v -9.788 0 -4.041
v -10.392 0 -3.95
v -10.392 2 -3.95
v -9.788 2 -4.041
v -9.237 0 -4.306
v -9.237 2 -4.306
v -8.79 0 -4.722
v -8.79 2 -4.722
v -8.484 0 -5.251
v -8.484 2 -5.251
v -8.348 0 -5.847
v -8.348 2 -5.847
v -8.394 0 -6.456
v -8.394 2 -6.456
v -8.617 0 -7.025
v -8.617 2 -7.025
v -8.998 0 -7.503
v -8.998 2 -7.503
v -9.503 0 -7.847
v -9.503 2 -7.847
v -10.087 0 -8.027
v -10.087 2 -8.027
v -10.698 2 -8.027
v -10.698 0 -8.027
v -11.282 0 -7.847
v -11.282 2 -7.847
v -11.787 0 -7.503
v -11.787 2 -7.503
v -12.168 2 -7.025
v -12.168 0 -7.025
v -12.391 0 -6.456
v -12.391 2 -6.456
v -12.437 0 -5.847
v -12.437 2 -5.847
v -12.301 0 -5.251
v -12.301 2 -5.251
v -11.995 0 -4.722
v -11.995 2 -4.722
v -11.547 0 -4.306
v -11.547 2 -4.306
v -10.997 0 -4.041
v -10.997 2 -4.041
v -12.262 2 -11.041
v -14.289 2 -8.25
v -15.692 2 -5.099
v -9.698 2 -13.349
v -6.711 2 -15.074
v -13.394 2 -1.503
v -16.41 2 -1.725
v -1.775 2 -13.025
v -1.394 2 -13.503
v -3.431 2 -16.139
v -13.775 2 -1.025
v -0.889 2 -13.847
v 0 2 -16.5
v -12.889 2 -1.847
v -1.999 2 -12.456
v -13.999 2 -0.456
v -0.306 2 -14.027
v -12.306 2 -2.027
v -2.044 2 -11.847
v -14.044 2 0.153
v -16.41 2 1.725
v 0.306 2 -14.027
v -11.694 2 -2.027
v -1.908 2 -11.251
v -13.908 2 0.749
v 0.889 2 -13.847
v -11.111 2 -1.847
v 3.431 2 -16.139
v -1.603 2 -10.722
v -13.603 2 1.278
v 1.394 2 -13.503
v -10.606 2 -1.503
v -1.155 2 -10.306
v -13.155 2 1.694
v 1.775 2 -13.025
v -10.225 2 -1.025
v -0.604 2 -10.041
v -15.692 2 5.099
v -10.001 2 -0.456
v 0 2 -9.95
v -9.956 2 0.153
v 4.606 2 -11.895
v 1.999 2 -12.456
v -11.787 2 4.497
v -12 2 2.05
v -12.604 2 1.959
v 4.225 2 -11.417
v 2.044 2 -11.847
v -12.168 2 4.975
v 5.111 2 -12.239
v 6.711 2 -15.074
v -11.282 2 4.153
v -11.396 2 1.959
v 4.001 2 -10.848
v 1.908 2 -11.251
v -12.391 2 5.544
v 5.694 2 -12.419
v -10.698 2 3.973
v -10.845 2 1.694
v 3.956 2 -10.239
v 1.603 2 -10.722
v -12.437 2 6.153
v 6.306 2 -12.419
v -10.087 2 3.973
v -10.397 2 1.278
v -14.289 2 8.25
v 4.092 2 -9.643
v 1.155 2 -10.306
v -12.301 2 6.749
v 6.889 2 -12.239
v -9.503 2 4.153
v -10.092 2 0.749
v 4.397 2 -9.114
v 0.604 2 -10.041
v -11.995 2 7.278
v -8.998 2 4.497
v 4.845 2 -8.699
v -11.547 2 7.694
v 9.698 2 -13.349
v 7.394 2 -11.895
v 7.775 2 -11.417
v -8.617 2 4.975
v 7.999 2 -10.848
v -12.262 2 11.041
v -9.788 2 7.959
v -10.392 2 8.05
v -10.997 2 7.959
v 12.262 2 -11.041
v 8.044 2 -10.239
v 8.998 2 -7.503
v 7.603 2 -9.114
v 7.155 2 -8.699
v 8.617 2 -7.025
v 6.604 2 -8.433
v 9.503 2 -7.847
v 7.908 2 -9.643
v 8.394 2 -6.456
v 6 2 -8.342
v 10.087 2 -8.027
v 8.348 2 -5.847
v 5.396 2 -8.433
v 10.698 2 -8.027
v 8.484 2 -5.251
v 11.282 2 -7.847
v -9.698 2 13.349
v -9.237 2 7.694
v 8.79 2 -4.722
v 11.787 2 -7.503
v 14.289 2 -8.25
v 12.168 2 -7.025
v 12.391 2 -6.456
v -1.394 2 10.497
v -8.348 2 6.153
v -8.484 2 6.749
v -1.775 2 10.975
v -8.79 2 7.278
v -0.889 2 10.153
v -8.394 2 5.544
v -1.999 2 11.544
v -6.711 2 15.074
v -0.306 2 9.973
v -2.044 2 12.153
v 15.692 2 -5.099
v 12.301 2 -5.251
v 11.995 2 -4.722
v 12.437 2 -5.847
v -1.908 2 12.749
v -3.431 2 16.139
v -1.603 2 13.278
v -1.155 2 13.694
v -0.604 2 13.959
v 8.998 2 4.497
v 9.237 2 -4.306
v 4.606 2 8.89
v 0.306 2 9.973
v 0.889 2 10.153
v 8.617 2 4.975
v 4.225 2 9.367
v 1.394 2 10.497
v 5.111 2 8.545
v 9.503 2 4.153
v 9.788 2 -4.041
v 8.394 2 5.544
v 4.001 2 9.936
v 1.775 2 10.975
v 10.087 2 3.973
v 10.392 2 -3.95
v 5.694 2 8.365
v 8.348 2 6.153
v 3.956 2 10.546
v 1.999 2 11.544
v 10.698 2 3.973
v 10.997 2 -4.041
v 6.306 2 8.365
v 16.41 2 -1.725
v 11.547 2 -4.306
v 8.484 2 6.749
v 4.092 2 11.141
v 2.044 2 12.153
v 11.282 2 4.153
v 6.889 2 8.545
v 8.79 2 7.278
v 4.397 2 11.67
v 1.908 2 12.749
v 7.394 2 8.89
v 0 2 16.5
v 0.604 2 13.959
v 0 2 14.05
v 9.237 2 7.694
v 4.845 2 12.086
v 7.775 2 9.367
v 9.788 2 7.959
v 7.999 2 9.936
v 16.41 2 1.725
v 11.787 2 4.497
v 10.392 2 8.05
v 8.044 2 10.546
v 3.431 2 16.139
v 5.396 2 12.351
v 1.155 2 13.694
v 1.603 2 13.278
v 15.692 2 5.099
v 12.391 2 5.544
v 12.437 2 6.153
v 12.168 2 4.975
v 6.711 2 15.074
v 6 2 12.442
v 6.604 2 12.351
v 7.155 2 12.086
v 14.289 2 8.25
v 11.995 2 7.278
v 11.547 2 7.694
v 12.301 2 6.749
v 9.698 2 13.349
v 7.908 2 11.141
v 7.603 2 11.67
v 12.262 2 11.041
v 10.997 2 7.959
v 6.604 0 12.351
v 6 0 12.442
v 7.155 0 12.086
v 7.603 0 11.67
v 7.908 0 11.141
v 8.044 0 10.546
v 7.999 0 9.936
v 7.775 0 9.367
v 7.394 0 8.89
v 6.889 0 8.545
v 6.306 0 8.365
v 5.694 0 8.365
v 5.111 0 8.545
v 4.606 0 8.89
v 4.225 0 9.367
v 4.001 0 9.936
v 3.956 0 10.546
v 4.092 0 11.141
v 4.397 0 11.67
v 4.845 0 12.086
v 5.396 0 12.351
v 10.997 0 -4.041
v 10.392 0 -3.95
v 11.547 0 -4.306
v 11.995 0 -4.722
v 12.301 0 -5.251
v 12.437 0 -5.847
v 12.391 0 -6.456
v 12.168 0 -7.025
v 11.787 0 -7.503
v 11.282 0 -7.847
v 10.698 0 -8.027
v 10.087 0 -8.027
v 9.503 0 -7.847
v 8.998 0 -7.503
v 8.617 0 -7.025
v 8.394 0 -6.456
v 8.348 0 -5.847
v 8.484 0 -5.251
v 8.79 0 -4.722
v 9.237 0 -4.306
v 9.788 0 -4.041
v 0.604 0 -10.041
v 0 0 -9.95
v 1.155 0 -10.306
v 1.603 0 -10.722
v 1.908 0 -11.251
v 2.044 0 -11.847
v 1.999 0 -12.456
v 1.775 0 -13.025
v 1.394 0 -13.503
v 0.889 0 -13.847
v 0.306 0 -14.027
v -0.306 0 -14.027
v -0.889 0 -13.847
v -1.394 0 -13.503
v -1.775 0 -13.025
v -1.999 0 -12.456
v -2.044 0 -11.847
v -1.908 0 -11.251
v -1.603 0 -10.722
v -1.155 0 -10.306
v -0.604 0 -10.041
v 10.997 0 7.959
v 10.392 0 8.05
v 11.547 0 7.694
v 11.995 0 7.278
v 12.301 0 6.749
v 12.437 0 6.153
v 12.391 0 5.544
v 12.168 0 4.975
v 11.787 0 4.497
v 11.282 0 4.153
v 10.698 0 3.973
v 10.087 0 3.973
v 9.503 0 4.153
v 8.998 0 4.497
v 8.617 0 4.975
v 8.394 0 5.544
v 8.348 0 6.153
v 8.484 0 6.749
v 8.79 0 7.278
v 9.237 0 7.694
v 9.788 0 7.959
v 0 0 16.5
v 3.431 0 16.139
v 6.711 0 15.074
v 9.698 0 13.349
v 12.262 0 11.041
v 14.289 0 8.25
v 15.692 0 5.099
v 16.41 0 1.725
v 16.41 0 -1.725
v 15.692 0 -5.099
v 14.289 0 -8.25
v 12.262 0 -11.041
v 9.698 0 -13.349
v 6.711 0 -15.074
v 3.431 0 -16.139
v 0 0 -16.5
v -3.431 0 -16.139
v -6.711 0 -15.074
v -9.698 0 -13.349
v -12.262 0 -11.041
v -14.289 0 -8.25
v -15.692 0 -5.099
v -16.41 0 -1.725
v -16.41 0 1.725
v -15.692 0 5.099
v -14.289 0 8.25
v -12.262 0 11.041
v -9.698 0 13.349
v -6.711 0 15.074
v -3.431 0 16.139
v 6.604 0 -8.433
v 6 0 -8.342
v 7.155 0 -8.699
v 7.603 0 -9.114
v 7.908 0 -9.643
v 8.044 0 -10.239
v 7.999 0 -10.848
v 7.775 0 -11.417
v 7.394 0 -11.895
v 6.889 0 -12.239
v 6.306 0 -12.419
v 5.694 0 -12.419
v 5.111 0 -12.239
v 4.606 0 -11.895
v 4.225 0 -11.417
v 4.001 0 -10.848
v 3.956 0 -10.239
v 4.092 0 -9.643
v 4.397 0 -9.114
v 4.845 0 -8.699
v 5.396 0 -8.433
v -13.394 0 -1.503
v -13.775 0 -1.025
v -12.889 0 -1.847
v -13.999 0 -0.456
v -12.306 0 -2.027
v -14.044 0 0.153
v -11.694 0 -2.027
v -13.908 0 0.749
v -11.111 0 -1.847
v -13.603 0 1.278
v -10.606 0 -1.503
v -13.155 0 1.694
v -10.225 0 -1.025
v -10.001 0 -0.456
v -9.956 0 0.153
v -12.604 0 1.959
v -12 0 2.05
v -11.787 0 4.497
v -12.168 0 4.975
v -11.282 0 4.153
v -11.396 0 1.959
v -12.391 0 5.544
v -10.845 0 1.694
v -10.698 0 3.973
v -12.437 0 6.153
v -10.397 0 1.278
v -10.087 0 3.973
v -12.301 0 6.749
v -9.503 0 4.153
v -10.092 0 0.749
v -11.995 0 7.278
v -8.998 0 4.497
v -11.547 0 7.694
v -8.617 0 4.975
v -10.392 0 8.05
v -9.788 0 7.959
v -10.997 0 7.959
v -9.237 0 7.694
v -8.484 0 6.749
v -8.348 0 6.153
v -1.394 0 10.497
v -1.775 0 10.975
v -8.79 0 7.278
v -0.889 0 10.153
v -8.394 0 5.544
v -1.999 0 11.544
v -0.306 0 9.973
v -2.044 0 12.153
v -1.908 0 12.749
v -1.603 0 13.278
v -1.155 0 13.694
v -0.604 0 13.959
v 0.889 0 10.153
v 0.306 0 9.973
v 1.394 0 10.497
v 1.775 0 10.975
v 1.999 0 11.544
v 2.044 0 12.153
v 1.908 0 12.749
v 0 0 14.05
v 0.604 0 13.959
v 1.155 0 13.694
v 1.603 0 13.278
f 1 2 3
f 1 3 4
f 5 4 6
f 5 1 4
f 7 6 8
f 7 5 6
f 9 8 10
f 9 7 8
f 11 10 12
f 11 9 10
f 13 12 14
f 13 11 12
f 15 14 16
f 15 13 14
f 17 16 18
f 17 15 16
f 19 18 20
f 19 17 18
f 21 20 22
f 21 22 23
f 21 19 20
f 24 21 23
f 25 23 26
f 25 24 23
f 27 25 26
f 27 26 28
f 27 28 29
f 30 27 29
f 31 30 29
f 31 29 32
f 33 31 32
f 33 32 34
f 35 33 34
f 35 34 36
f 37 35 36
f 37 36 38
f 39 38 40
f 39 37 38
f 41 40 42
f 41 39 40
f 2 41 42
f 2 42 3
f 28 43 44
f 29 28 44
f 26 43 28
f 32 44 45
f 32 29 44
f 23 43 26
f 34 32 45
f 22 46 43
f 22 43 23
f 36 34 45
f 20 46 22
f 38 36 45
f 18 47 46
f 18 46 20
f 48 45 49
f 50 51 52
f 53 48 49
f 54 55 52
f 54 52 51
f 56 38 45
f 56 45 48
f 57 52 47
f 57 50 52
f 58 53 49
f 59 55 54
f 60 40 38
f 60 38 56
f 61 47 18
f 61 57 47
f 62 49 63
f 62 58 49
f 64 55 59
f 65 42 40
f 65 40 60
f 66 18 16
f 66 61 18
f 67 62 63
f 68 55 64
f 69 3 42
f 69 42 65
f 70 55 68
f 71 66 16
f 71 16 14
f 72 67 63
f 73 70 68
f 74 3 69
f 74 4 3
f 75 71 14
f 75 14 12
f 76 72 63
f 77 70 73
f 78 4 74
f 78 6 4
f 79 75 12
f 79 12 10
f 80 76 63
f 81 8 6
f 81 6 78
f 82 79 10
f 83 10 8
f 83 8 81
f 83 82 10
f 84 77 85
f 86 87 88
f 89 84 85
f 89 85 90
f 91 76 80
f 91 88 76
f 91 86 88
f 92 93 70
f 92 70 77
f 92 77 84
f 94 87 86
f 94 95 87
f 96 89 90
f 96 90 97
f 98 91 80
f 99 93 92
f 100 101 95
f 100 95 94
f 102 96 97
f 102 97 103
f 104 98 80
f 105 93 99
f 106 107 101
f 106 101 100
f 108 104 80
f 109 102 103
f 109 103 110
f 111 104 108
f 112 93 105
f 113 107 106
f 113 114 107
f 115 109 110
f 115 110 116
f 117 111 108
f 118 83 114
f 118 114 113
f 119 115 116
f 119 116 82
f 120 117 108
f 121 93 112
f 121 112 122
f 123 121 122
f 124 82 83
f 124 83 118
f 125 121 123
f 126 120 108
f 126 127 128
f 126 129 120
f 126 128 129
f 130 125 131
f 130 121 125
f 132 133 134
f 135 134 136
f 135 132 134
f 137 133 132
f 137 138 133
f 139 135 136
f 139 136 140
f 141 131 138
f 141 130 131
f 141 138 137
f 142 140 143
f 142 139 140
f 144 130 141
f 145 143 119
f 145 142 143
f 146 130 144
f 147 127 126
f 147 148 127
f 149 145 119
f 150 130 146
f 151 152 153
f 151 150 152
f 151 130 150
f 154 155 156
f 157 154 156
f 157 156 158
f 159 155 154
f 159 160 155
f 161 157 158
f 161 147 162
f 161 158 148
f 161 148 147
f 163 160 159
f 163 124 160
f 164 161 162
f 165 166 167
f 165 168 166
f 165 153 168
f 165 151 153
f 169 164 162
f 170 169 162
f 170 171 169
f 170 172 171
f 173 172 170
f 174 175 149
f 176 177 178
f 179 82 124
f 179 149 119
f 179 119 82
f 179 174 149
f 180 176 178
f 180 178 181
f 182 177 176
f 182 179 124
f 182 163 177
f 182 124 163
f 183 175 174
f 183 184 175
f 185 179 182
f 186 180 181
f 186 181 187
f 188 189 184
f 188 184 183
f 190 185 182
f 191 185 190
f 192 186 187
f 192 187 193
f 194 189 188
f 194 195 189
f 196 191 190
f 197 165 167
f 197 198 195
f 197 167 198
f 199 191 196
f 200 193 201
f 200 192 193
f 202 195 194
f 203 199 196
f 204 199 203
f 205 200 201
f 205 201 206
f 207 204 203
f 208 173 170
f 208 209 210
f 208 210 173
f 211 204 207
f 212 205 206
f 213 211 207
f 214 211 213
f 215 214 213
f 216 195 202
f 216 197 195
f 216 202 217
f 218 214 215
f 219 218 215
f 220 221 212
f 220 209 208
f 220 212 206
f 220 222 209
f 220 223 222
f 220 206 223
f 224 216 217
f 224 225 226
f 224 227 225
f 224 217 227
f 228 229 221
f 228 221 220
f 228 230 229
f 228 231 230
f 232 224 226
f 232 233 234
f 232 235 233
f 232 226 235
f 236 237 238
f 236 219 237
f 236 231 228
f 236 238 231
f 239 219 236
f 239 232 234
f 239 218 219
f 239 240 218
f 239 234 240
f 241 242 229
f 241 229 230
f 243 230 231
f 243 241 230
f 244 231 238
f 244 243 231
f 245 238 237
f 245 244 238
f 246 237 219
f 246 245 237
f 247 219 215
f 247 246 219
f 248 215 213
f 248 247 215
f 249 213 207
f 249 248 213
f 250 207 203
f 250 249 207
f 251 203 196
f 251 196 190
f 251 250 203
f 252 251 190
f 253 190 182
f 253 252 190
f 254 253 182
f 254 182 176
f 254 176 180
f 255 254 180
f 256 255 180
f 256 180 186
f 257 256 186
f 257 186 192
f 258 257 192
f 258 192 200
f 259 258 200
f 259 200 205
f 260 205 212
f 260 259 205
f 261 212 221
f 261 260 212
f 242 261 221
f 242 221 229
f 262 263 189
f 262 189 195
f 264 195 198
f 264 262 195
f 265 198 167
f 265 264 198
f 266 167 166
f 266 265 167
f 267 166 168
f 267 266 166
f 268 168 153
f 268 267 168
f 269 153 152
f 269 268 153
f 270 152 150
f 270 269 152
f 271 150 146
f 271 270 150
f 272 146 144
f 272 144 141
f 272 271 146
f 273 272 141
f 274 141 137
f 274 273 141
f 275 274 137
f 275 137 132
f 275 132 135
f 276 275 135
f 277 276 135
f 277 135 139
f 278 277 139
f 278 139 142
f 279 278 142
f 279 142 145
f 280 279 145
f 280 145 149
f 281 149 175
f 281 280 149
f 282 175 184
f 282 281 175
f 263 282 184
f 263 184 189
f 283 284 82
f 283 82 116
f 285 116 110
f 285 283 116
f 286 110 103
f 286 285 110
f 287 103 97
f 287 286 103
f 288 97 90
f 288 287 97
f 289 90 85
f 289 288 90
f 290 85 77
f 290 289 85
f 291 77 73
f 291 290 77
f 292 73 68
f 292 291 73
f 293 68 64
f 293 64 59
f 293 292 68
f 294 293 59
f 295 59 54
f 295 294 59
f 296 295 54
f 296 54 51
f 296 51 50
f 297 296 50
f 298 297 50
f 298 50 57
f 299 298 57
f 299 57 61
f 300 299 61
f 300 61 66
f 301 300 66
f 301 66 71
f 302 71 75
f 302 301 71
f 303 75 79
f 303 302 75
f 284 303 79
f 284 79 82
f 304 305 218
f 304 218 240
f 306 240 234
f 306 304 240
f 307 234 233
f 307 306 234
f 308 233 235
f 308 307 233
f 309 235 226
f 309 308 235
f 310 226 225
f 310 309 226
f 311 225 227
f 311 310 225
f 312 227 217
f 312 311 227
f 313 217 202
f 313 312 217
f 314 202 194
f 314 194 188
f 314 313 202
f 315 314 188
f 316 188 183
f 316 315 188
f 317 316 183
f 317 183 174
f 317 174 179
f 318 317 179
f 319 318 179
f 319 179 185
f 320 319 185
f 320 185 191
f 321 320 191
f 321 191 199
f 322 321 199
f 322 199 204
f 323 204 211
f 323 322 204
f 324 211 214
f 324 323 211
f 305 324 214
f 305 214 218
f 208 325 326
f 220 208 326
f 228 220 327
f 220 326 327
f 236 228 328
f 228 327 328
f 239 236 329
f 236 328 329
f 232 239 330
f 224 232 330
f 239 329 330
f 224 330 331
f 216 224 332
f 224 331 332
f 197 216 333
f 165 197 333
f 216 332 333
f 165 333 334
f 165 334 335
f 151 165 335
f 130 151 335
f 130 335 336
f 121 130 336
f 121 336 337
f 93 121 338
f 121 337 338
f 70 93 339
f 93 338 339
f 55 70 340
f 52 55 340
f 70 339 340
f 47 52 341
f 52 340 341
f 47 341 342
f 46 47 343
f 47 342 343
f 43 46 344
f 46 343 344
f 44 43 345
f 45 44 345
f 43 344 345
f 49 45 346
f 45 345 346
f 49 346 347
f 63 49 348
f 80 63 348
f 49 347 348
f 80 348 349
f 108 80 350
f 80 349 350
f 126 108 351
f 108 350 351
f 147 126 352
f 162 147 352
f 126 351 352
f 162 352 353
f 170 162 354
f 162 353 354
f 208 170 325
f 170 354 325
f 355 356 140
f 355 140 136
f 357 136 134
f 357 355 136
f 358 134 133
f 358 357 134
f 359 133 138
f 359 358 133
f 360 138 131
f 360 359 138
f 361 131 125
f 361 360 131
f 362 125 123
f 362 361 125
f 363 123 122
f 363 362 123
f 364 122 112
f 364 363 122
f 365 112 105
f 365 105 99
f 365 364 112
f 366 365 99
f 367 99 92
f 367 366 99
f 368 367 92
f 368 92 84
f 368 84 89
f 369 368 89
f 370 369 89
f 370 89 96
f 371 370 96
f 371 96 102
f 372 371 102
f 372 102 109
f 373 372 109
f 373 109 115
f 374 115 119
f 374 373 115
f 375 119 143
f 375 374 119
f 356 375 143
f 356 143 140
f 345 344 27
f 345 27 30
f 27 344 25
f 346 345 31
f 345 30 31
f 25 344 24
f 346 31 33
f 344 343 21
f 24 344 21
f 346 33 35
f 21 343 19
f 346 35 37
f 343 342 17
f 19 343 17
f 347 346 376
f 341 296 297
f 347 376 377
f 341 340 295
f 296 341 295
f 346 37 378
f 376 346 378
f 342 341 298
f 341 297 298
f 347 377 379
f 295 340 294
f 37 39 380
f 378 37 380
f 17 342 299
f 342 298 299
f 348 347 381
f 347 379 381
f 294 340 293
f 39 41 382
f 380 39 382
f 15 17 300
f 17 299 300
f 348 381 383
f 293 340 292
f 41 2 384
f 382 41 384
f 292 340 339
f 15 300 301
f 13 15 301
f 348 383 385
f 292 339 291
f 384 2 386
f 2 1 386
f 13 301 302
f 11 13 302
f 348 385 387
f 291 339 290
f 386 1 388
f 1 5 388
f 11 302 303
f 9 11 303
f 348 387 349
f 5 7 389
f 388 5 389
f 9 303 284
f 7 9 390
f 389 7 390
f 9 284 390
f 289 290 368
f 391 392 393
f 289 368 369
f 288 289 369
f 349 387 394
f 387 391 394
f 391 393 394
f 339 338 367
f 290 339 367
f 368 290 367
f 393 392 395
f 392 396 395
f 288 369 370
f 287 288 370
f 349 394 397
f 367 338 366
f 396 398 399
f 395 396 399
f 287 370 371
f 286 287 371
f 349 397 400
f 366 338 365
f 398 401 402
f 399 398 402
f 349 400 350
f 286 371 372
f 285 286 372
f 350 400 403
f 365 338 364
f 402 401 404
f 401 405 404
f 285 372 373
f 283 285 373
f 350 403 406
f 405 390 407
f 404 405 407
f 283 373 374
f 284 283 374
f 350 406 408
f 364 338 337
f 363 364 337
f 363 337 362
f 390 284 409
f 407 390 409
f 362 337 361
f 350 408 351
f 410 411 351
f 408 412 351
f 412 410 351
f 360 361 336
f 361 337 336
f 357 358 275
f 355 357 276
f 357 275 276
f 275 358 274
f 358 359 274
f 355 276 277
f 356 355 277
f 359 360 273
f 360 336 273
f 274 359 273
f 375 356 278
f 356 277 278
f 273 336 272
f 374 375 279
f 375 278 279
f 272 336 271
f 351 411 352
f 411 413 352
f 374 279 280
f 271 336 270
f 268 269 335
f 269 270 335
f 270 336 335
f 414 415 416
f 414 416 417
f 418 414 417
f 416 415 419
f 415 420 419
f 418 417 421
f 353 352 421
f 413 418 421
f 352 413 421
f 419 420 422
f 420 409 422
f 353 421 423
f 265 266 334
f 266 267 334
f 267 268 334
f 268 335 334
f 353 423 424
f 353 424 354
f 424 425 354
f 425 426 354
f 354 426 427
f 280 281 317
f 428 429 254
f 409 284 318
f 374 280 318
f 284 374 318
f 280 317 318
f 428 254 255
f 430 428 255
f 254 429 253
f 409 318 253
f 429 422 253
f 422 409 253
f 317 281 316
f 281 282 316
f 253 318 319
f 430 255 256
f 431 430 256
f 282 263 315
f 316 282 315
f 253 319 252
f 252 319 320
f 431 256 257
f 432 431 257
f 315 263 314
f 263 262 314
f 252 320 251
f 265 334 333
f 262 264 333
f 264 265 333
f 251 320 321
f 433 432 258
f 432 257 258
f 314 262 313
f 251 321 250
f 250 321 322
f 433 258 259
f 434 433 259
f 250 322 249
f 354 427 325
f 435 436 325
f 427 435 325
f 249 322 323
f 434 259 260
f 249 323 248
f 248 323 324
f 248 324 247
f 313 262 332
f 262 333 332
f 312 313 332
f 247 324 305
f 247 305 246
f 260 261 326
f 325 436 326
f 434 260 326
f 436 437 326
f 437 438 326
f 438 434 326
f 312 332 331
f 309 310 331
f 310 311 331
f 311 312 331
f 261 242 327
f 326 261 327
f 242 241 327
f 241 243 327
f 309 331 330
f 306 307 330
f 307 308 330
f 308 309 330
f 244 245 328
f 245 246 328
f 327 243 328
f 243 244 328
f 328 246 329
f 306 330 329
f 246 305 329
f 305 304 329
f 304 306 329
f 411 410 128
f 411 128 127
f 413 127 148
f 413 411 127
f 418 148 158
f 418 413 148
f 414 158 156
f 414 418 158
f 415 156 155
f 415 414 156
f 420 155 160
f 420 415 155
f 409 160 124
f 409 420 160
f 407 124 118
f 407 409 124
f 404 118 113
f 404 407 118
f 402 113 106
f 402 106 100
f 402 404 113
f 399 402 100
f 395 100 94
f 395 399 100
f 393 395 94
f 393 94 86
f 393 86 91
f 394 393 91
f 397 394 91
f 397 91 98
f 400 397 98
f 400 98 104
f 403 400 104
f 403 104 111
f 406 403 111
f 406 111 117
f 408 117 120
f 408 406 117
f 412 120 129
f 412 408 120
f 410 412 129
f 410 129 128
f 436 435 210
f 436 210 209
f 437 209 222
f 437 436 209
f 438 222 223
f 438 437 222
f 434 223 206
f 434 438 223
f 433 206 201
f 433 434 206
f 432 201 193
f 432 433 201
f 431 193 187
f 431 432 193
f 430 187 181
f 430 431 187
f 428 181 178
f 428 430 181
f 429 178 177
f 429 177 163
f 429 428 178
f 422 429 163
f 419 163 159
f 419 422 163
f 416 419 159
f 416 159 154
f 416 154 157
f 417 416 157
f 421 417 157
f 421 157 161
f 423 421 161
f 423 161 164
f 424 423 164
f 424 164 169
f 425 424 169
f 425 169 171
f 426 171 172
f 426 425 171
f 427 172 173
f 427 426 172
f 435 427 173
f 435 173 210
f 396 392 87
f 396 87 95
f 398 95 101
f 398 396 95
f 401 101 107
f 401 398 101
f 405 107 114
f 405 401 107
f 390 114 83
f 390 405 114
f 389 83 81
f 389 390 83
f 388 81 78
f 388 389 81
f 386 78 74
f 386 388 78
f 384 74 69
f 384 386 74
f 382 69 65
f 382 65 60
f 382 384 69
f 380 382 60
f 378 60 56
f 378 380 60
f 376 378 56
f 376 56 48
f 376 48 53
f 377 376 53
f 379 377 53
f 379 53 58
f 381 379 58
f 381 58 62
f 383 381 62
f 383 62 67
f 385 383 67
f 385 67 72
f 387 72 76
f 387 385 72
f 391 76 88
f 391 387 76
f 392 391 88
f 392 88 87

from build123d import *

# Parameters (mm, degrees)
SKETCH_1_R      = 16.5
SKETCH_1_R_2    = 2.05
EXTRUDE_1_DEPTH = 2


with BuildPart() as part:
    # 草图1 → 凸台-拉伸1 (new body)
    with BuildSketch(Plane(origin=(0, 0, 0), x_dir=(1, 0, 0), z_dir=(0, 1, 0))):
        with Locations(Location((0, 0, 0), (0, 0, 270))):
            Circle(SKETCH_1_R)
        with Locations(Location((-12, 0, 0), (0, 0, 270))):
            Circle(SKETCH_1_R_2, mode=Mode.SUBTRACT)
        with Locations(Location((6, 10.392304845, 0), (0, 0, 270))):
            Circle(SKETCH_1_R_2, mode=Mode.SUBTRACT)
        with Locations(Location((6, -10.392304845, 0), (0, 0, 270))):
            Circle(SKETCH_1_R_2, mode=Mode.SUBTRACT)
        with Locations(Location((0, 12, 0), (0, 0, 270))):
            Circle(SKETCH_1_R_2, mode=Mode.SUBTRACT)
        with Locations(Location((-10.392304845, 6, 0), (0, 0, 270))):
            Circle(SKETCH_1_R_2, mode=Mode.SUBTRACT)
        with Locations(Location((10.392304845, 6, 0), (0, 0, 270))):
            Circle(SKETCH_1_R_2, mode=Mode.SUBTRACT)
        with Locations(Location((10.392304845, -6, 0), (0, 0, 270))):
            Circle(SKETCH_1_R_2, mode=Mode.SUBTRACT)
        with Locations(Location((0, -12, 0), (0, 0, 270))):
            Circle(SKETCH_1_R_2, mode=Mode.SUBTRACT)
        with Locations(Location((-10.392304845, -6, 0), (0, 0, 270))):
            Circle(SKETCH_1_R_2, mode=Mode.SUBTRACT)
    extrude(amount=EXTRUDE_1_DEPTH)


solid = part.part
